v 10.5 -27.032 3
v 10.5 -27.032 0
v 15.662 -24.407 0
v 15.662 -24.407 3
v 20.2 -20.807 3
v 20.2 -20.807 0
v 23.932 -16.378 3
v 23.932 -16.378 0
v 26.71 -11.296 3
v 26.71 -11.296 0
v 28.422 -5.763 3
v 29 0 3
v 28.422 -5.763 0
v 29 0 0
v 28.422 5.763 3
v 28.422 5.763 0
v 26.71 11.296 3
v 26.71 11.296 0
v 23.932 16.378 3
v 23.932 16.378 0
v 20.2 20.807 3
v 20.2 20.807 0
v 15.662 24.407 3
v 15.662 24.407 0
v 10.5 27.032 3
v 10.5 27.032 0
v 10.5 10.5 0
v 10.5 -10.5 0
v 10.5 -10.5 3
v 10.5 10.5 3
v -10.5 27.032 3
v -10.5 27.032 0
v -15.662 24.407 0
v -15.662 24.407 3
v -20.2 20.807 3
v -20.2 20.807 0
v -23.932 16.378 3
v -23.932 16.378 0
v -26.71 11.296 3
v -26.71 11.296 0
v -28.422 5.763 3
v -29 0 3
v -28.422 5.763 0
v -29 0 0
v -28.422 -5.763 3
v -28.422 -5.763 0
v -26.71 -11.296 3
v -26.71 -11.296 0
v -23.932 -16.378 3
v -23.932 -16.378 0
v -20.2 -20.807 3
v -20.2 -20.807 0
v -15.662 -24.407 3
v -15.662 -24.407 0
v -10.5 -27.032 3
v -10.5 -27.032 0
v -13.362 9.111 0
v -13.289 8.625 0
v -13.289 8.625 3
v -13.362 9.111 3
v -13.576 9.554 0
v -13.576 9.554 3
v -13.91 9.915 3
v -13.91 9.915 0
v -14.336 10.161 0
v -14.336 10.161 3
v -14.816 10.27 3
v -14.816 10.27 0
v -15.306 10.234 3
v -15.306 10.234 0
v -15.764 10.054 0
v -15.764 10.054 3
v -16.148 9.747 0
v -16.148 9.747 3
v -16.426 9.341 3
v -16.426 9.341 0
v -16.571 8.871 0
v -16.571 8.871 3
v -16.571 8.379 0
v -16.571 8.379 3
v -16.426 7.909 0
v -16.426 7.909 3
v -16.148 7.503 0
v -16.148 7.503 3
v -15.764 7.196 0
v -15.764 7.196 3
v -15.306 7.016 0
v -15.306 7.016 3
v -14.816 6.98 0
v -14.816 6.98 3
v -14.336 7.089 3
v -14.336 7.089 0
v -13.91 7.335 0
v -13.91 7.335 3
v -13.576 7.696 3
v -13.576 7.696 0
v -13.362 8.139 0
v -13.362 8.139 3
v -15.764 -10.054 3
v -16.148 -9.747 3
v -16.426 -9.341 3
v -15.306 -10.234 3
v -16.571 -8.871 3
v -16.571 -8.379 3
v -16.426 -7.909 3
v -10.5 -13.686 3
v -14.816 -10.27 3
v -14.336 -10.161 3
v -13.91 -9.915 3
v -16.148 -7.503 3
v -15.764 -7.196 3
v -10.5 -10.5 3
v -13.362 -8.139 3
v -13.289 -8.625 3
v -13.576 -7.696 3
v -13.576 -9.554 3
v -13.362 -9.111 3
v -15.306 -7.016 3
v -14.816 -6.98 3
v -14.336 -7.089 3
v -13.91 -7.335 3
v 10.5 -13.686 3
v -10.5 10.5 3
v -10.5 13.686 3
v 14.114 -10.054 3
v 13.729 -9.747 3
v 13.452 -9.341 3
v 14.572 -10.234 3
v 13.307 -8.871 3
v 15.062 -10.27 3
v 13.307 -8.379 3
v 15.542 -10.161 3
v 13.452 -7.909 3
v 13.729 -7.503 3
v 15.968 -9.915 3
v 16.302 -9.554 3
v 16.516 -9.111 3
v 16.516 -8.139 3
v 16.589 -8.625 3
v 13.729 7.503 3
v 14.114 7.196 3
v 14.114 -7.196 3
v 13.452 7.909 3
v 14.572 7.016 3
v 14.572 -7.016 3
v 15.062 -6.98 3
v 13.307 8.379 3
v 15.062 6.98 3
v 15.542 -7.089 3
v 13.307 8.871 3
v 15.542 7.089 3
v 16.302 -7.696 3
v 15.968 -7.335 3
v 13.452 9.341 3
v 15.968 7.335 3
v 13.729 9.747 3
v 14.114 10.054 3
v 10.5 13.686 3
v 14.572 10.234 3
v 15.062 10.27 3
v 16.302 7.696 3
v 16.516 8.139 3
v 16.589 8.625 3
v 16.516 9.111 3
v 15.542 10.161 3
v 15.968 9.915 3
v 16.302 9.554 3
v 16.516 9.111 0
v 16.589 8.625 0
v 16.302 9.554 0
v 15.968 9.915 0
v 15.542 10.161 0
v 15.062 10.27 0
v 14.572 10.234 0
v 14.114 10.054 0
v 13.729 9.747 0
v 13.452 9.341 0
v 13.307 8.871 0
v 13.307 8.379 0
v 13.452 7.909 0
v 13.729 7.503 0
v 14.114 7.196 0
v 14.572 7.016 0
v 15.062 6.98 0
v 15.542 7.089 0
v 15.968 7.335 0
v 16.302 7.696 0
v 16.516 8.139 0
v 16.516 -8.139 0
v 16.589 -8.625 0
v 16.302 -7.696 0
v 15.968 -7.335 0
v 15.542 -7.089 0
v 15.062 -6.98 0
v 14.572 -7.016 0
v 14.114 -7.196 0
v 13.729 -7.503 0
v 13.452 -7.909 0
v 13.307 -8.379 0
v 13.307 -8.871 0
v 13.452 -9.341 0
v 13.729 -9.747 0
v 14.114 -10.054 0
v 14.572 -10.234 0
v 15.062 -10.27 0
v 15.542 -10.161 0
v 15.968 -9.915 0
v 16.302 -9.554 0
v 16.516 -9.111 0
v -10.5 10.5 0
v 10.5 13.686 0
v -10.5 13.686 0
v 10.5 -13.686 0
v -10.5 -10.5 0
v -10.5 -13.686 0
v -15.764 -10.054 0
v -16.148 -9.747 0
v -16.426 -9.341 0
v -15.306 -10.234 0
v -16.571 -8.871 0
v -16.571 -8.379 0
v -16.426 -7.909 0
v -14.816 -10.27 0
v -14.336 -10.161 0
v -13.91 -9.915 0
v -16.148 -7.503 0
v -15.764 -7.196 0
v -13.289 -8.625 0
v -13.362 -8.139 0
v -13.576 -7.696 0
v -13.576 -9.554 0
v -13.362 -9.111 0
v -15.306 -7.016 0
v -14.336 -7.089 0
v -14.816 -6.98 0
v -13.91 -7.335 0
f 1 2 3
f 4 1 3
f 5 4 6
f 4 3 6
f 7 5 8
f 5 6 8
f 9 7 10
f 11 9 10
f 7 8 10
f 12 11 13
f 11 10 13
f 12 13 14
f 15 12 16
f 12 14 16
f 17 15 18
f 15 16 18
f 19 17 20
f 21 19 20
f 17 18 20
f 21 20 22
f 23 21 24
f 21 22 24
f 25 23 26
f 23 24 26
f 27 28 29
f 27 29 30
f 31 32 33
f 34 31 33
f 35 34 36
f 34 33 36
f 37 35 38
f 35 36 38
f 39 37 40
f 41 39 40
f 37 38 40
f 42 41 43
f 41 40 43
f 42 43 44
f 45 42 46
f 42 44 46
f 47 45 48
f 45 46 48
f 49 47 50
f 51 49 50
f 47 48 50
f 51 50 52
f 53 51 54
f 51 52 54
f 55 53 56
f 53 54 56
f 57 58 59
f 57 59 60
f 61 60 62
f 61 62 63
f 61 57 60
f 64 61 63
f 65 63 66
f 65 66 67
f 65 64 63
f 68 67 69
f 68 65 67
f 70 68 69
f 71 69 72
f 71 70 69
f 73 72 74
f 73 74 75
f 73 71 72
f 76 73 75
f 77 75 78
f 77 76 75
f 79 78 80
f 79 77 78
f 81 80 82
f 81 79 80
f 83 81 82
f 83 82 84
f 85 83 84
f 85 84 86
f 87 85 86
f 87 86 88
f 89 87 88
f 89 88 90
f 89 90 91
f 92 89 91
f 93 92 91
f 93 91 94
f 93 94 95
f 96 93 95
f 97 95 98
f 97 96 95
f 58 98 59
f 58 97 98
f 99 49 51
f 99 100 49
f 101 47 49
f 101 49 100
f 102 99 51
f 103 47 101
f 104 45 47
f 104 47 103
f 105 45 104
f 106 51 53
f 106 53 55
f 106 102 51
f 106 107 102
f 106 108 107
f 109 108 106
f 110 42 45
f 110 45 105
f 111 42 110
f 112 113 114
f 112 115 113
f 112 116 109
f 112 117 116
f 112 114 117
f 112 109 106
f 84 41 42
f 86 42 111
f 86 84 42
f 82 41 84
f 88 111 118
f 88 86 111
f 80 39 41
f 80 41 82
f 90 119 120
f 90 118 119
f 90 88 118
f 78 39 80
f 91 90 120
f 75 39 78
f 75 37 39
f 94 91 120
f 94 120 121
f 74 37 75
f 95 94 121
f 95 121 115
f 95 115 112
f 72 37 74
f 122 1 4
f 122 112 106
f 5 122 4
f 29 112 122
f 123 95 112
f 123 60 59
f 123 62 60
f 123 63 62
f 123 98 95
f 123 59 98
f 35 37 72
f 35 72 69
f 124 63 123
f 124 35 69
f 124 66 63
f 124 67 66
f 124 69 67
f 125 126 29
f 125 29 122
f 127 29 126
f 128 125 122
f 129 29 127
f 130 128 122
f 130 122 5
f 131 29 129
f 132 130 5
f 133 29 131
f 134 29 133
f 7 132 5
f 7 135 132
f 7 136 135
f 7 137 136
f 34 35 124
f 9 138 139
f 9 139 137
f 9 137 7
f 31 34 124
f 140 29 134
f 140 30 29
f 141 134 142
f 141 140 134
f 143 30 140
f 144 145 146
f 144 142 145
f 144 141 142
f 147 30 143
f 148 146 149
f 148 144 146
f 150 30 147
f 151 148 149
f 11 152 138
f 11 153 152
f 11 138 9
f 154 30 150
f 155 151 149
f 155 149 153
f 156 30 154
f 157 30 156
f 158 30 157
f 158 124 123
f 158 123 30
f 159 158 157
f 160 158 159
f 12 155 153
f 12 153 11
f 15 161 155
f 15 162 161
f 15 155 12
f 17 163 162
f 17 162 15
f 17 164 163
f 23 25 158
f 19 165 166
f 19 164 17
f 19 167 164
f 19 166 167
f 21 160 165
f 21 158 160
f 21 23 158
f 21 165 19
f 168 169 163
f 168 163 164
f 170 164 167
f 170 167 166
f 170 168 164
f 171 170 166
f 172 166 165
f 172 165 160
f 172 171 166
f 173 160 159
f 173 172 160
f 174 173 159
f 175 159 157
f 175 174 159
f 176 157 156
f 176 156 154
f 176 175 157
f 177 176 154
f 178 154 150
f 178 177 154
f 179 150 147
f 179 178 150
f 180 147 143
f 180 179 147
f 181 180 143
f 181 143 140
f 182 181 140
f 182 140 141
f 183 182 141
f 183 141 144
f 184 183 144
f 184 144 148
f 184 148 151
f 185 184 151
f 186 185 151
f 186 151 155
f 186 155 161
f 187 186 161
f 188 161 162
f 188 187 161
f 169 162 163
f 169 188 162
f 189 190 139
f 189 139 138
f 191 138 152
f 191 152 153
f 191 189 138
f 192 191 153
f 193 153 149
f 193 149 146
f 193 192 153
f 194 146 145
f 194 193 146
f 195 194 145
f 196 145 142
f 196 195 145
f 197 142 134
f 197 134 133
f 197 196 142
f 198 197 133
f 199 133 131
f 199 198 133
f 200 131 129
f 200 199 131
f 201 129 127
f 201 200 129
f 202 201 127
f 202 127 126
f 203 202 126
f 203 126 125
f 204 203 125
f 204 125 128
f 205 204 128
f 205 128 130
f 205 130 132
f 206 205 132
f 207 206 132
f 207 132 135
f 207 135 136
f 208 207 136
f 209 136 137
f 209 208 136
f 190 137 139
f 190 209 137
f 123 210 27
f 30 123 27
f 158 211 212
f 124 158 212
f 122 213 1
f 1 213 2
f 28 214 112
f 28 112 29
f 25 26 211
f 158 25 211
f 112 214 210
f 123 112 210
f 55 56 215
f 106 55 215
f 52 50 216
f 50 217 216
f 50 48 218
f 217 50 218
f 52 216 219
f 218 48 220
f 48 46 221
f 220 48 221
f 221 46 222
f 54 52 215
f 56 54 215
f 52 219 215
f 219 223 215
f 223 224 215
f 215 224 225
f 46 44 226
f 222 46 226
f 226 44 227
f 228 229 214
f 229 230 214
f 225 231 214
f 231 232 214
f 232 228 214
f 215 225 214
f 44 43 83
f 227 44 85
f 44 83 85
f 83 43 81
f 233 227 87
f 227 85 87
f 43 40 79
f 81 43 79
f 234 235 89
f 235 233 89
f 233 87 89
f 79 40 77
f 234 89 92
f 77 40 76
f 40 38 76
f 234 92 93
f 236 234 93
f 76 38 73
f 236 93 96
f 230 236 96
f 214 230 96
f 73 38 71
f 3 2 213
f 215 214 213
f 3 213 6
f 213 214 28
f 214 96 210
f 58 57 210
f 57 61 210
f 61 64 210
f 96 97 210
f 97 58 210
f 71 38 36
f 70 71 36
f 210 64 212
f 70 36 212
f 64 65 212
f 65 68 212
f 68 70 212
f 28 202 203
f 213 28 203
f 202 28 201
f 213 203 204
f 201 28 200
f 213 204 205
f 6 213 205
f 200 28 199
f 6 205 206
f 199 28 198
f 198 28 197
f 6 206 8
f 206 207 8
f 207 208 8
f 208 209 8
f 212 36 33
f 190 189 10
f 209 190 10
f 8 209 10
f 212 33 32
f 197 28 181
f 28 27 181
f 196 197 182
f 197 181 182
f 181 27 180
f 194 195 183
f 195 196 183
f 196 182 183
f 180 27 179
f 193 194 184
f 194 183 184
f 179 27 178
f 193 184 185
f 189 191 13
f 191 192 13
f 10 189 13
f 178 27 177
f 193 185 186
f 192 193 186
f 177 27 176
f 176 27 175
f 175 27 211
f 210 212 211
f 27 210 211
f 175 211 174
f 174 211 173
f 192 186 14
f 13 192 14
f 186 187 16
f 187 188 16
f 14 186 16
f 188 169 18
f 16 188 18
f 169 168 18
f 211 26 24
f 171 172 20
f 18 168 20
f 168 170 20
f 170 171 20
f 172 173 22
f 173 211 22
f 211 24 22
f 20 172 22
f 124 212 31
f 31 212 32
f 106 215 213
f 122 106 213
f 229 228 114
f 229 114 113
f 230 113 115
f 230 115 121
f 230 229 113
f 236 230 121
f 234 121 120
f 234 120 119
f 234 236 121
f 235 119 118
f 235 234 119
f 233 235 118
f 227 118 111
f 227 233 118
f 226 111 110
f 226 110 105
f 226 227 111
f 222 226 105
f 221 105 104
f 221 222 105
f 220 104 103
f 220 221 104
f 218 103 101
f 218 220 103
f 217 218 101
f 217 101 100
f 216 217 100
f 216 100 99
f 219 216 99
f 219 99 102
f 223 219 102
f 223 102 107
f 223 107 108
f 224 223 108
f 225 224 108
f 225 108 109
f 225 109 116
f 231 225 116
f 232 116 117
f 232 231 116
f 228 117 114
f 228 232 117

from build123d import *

# Parameters (mm, degrees)
SKETCH_1_R      = 1.65
SKETCH_1_W      = 21
SKETCH_1_H      = 21
EXTRUDE_1_DEPTH = 3


with BuildPart() as part:
    # 草图1 → 凸台-拉伸1 (new body)
    with BuildSketch(Plane.XY):
        with BuildLine():
            Line((10.5, -13.686215693), (10.5, -27.032387982))
            ThreePointArc((10.5, -27.032387982), (29, 0), (10.5, 27.032387982))
            Line((10.5, 27.032387982), (10.5, 13.686215693))
            Line((10.5, 13.686215693), (-10.5, 13.686215693))
            Line((-10.5, 13.686215693), (-10.5, 27.032387982))
            ThreePointArc((-10.5, 27.032387982), (-29, 0), (-10.5, -27.032387982))
            Line((-10.5, -27.032387982), (-10.5, -13.686215693))
            Line((-10.5, -13.686215693), (10.5, -13.686215693))
        make_face()
        with Locations((14.938938215, 8.625)):
            Circle(SKETCH_1_R, mode=Mode.SUBTRACT)
        with Locations((14.938938215, -8.625)):
            Circle(SKETCH_1_R, mode=Mode.SUBTRACT)
        with Locations((-14.938938215, -8.625)):
            Circle(SKETCH_1_R, mode=Mode.SUBTRACT)
        with Locations((-14.938938215, 8.625)):
            Circle(SKETCH_1_R, mode=Mode.SUBTRACT)
        Rectangle(SKETCH_1_W, SKETCH_1_H, mode=Mode.SUBTRACT)
    extrude(amount=EXTRUDE_1_DEPTH)


solid = part.part
